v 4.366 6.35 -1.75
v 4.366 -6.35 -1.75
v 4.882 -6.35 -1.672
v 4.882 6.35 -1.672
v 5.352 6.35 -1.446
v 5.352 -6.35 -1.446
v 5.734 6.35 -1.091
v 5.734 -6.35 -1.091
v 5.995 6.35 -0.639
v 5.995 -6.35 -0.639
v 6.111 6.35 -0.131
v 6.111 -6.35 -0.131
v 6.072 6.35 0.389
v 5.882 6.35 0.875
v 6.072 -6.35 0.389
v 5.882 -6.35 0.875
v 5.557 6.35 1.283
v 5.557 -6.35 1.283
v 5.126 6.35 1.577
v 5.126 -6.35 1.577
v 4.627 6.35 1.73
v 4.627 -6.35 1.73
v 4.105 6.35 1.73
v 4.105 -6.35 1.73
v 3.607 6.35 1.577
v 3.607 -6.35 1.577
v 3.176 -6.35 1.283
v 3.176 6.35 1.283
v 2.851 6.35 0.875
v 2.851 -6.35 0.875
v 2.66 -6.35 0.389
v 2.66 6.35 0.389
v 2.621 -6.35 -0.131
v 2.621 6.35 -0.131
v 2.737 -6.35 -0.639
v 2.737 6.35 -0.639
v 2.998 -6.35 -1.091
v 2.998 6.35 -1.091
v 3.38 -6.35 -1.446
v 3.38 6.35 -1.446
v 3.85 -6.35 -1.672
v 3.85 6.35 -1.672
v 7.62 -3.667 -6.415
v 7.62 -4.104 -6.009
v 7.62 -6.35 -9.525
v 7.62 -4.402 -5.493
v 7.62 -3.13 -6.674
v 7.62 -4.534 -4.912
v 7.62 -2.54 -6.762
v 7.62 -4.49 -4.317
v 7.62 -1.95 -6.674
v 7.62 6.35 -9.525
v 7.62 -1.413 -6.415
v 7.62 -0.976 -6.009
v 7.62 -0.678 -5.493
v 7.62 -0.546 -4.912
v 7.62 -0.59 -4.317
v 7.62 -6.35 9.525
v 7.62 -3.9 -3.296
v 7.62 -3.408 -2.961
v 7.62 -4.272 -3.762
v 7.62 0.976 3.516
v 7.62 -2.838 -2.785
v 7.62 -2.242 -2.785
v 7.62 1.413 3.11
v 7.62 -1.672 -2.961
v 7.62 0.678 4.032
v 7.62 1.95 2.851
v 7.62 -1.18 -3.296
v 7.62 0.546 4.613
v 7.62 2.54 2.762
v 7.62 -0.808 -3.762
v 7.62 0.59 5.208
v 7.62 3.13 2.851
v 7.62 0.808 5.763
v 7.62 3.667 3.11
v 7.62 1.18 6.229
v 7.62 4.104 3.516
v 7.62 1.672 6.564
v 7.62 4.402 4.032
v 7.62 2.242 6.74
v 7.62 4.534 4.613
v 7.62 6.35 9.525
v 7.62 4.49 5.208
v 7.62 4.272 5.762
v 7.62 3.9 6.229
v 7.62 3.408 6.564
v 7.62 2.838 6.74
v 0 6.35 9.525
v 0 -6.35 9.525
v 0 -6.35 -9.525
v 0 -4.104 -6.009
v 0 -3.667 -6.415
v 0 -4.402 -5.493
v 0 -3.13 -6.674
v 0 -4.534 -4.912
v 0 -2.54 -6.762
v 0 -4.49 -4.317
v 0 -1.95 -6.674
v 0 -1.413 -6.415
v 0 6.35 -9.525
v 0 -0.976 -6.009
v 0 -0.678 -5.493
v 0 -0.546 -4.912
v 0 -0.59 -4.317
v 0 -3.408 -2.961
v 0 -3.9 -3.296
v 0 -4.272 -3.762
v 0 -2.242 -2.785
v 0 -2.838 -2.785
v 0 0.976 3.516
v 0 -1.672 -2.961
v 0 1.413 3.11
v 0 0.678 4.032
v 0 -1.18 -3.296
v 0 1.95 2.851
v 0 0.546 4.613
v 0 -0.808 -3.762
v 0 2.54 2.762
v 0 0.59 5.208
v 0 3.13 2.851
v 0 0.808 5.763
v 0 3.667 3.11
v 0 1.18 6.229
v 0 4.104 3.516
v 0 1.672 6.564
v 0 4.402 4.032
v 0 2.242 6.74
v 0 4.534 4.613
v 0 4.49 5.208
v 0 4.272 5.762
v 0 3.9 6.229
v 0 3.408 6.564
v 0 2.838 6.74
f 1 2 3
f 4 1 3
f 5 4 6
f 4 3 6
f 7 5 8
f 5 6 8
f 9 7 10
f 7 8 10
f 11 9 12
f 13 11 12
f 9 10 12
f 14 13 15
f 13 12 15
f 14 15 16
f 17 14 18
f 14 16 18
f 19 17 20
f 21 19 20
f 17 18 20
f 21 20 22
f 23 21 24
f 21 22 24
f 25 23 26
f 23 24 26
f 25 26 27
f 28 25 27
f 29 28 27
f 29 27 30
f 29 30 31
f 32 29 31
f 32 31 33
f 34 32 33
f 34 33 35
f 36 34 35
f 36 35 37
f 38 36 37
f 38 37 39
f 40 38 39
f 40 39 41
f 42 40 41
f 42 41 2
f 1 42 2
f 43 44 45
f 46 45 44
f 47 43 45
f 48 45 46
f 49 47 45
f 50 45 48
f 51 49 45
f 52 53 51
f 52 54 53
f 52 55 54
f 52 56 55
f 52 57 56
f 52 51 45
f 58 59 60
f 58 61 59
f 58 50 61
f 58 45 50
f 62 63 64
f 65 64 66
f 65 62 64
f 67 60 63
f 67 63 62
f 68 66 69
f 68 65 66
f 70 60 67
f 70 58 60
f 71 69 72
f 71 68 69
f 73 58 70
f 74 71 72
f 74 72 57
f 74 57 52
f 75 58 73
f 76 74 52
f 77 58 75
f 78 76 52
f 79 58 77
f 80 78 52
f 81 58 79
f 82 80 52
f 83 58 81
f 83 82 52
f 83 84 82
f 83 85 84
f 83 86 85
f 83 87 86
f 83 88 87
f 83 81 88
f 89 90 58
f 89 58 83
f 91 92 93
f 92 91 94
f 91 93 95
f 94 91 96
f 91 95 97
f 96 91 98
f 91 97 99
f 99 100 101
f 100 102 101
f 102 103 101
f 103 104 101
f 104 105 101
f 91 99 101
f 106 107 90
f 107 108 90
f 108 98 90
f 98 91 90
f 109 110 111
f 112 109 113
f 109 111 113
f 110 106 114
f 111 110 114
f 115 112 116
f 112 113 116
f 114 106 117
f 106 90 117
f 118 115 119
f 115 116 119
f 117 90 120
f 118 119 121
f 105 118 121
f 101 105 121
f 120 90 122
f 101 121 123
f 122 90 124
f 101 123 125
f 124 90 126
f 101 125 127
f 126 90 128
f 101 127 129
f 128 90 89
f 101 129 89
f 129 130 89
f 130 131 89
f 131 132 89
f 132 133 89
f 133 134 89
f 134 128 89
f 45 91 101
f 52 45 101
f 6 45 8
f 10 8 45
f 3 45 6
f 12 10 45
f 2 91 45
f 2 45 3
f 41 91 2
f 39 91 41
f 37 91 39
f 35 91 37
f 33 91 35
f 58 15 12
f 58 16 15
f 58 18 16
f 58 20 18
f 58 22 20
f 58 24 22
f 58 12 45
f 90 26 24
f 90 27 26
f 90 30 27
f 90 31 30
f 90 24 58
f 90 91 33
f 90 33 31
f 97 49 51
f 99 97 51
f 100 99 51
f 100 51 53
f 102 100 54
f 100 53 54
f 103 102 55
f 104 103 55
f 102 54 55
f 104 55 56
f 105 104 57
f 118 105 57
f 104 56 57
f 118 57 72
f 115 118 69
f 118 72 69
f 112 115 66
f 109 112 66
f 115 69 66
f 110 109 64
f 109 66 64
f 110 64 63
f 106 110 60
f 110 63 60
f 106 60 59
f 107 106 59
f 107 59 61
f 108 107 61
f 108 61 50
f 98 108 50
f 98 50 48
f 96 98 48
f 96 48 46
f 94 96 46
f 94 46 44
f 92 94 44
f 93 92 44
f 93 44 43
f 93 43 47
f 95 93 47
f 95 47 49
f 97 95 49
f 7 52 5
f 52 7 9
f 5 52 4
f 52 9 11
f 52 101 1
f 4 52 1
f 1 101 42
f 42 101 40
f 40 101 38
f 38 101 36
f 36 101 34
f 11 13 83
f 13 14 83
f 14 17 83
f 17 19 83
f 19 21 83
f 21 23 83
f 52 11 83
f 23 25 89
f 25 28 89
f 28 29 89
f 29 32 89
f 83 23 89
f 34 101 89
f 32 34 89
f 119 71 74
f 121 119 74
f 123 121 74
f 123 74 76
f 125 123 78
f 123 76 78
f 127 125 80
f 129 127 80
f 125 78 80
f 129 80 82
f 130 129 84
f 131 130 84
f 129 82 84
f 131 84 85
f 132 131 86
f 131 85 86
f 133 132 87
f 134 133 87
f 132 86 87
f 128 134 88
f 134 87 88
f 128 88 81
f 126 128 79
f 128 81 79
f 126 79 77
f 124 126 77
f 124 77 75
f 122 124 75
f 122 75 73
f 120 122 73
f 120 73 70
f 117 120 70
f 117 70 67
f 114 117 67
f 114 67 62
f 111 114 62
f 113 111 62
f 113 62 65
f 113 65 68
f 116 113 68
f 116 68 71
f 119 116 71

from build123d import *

# Parameters (mm, degrees)
SKETCH1_W           = 12.7
SKETCH1_H           = 19.05
BOSS_EXTRUDE1_DEPTH = 7.62
SKETCH3_R           = 1.75
CUT_EXTRUDE1_DEPTH  = 22.2885
SKETCH4_R           = 2
CUT_EXTRUDE2_DEPTH  = 22.2885


with BuildPart() as part:
    # Sketch1 → Boss-Extrude1 (new body)
    with BuildSketch(Plane.YZ):
        Rectangle(SKETCH1_W, SKETCH1_H)
    extrude(amount=BOSS_EXTRUDE1_DEPTH)

    # Sketch3 → Cut-Extrude1 (cut)
    with BuildSketch(Plane.XZ.offset(6.35)):
        with Locations((4.36625, 0)):
            Circle(SKETCH3_R)
    extrude(amount=-CUT_EXTRUDE1_DEPTH, mode=Mode.SUBTRACT)

    # Sketch4 → Cut-Extrude2 (cut)
    with BuildSketch(Plane.YZ.offset(7.62)):
        with Locations((2.54, 4.7625)):
            Circle(SKETCH4_R)
        with Locations((-2.54, -4.7625)):
            Circle(SKETCH4_R)
    extrude(amount=-CUT_EXTRUDE2_DEPTH, mode=Mode.SUBTRACT)


solid = part.part
